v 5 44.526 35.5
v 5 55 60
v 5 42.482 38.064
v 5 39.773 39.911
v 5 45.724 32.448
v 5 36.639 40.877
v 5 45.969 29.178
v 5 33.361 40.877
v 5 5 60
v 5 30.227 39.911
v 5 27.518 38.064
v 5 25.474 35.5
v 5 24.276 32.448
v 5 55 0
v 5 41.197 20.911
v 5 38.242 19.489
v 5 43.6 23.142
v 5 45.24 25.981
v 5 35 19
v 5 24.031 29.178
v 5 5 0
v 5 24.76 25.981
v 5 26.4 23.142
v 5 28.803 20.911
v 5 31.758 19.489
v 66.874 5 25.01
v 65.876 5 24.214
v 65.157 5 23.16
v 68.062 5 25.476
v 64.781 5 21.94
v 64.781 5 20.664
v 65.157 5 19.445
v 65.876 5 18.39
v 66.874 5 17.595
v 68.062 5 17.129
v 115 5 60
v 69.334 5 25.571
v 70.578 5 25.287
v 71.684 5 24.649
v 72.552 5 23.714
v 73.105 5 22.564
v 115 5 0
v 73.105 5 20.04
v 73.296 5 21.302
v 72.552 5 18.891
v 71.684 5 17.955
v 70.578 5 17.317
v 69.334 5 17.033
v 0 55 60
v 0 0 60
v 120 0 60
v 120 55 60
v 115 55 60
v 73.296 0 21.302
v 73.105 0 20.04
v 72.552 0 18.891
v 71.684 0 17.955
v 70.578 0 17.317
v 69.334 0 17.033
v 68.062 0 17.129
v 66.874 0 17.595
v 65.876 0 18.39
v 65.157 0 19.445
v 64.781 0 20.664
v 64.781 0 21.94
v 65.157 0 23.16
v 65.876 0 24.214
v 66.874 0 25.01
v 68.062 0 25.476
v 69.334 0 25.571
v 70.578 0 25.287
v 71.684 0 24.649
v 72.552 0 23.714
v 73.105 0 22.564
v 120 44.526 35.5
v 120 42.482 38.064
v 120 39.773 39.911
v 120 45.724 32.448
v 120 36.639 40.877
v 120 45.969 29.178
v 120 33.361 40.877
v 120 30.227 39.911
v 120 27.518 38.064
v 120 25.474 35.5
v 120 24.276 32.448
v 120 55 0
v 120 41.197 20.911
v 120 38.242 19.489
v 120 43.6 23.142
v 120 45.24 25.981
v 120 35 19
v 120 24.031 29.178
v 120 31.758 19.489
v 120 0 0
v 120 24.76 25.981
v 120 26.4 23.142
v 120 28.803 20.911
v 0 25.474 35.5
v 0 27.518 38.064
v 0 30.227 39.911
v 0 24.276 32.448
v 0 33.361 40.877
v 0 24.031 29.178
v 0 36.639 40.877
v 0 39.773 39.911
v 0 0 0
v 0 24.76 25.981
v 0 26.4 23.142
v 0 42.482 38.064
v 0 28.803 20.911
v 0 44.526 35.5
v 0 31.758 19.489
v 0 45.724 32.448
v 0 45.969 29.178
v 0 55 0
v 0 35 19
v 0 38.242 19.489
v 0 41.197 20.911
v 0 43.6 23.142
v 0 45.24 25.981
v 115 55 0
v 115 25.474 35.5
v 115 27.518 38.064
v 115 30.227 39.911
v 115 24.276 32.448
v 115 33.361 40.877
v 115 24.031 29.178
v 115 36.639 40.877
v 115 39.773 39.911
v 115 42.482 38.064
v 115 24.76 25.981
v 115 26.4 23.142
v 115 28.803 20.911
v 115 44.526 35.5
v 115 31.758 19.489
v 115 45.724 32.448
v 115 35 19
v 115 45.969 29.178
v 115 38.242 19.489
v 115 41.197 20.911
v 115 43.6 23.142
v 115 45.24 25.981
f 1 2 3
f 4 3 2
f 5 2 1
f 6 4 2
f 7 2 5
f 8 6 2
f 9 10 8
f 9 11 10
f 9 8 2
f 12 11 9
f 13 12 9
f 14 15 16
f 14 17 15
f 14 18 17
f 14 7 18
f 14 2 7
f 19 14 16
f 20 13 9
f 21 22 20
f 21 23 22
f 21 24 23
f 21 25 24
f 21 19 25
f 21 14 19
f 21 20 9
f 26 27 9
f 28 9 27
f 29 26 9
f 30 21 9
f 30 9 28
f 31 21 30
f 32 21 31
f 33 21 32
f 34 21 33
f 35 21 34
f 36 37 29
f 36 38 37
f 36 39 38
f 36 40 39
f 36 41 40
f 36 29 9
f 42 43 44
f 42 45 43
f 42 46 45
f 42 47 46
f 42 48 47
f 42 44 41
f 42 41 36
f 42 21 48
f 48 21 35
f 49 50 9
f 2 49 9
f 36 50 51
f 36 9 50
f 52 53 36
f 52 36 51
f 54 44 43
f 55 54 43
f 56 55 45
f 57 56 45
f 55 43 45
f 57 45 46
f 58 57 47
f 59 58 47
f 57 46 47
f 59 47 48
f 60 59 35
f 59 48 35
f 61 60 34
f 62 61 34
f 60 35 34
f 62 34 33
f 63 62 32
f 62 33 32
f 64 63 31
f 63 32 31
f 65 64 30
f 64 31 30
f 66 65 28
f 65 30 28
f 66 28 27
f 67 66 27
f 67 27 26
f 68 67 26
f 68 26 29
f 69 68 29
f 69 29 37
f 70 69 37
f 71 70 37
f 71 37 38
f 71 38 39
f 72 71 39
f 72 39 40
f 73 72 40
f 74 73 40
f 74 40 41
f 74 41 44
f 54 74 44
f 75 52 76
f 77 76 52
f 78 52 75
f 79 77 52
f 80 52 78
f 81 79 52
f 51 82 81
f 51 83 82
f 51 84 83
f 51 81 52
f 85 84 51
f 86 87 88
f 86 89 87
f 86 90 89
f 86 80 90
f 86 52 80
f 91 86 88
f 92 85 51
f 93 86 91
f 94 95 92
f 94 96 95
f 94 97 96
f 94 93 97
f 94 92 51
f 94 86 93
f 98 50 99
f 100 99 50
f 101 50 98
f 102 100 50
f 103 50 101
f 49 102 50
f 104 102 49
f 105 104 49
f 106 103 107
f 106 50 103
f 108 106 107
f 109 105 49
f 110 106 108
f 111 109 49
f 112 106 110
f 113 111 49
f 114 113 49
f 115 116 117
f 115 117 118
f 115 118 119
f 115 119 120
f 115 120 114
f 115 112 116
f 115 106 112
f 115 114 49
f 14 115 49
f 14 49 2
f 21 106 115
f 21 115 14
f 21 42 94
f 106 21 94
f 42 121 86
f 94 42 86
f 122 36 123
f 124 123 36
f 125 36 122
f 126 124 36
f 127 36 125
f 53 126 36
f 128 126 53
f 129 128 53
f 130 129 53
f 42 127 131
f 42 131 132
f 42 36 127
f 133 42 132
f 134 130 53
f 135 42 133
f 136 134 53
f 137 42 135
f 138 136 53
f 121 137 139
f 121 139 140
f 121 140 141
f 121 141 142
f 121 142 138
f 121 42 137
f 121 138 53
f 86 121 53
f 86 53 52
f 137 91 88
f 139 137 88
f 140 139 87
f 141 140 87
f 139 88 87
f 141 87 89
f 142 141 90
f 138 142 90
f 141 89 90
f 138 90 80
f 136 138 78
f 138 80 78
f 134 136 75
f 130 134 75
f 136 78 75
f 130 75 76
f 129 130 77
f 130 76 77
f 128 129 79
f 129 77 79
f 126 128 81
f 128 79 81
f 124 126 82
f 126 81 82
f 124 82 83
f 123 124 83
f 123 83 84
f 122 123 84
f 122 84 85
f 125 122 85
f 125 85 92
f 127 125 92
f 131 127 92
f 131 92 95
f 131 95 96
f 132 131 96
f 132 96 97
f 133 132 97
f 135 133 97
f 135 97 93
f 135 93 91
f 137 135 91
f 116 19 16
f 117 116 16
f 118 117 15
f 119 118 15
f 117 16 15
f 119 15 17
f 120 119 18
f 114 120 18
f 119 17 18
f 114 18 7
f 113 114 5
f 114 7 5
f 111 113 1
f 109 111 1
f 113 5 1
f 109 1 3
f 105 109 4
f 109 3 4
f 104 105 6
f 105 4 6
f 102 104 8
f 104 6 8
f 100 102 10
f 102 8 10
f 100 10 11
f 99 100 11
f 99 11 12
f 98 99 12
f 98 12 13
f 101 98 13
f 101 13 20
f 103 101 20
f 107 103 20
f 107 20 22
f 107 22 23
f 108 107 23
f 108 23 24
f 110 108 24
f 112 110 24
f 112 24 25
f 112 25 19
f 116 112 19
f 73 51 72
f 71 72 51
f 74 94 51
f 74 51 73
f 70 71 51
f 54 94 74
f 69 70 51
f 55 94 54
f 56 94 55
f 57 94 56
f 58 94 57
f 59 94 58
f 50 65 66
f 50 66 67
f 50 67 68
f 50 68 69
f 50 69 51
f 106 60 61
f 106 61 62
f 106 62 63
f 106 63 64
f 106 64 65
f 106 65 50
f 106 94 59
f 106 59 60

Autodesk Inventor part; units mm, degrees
ref_plane "YZ Plane" through (0, 0, 0) normal (1, 0, 0) x (0, 1, 0)
ref_plane "XZ Plane" through (0, 0, 0) normal (0, 1, 0) x (-1, 0, 0)
ref_plane "XY Plane" through (0, 0, 0) normal (0, 0, 1) x (1, 0, 0)
sketch "Sketch1" plane through (0, 0, 0) normal (0, 0, 1) x (1, 0, 0)
  line L0 (0, 0) -> (0, 55)
  line L1 (0, 55) -> (5, 55)
  line L2 (5, 55) -> (5, 5)
  line L3 (5, 5) -> (115, 5)
  line L4 (115, 5) -> (115, 55)
  line L5 (115, 55) -> (120, 55)
  line L6 (120, 55) -> (120, 0)
  line L7 (120, 0) -> (0, 0)
  dimension "d0" = 5
  dimension "d1" = 50
  dimension "d2" = 120
  dimension "d3" = 5
extrude "Extrusion1" add sketch "Sketch1" along normal blind 60
sketch "Sketch2" plane through (120, 0, 0) normal (1, 0, 0) x (0, 0, -1)
  line L0 (0, 55) -> (-60, 55) projected
  line L1 (-30, 55) -> (-30, 35) construction
  circle A0 centre (-30, 35) radius 11
  point P0 (0, 0)
  dimension "d6" = 22
  dimension "d7" = 20
extrude "Extrusion2" cut sketch "Sketch2" against normal through all
sketch "Sketch3" plane through (5, 5, 0) normal (0, 1, 0) x (1, 0, 0)
  circle A0 centre (64.0144, -21.3023) radius 4.2811
  point P0 (-5, 0)
extrude "Extrusion3" cut sketch "Sketch3" against normal through all
properties part number "CamMount"
